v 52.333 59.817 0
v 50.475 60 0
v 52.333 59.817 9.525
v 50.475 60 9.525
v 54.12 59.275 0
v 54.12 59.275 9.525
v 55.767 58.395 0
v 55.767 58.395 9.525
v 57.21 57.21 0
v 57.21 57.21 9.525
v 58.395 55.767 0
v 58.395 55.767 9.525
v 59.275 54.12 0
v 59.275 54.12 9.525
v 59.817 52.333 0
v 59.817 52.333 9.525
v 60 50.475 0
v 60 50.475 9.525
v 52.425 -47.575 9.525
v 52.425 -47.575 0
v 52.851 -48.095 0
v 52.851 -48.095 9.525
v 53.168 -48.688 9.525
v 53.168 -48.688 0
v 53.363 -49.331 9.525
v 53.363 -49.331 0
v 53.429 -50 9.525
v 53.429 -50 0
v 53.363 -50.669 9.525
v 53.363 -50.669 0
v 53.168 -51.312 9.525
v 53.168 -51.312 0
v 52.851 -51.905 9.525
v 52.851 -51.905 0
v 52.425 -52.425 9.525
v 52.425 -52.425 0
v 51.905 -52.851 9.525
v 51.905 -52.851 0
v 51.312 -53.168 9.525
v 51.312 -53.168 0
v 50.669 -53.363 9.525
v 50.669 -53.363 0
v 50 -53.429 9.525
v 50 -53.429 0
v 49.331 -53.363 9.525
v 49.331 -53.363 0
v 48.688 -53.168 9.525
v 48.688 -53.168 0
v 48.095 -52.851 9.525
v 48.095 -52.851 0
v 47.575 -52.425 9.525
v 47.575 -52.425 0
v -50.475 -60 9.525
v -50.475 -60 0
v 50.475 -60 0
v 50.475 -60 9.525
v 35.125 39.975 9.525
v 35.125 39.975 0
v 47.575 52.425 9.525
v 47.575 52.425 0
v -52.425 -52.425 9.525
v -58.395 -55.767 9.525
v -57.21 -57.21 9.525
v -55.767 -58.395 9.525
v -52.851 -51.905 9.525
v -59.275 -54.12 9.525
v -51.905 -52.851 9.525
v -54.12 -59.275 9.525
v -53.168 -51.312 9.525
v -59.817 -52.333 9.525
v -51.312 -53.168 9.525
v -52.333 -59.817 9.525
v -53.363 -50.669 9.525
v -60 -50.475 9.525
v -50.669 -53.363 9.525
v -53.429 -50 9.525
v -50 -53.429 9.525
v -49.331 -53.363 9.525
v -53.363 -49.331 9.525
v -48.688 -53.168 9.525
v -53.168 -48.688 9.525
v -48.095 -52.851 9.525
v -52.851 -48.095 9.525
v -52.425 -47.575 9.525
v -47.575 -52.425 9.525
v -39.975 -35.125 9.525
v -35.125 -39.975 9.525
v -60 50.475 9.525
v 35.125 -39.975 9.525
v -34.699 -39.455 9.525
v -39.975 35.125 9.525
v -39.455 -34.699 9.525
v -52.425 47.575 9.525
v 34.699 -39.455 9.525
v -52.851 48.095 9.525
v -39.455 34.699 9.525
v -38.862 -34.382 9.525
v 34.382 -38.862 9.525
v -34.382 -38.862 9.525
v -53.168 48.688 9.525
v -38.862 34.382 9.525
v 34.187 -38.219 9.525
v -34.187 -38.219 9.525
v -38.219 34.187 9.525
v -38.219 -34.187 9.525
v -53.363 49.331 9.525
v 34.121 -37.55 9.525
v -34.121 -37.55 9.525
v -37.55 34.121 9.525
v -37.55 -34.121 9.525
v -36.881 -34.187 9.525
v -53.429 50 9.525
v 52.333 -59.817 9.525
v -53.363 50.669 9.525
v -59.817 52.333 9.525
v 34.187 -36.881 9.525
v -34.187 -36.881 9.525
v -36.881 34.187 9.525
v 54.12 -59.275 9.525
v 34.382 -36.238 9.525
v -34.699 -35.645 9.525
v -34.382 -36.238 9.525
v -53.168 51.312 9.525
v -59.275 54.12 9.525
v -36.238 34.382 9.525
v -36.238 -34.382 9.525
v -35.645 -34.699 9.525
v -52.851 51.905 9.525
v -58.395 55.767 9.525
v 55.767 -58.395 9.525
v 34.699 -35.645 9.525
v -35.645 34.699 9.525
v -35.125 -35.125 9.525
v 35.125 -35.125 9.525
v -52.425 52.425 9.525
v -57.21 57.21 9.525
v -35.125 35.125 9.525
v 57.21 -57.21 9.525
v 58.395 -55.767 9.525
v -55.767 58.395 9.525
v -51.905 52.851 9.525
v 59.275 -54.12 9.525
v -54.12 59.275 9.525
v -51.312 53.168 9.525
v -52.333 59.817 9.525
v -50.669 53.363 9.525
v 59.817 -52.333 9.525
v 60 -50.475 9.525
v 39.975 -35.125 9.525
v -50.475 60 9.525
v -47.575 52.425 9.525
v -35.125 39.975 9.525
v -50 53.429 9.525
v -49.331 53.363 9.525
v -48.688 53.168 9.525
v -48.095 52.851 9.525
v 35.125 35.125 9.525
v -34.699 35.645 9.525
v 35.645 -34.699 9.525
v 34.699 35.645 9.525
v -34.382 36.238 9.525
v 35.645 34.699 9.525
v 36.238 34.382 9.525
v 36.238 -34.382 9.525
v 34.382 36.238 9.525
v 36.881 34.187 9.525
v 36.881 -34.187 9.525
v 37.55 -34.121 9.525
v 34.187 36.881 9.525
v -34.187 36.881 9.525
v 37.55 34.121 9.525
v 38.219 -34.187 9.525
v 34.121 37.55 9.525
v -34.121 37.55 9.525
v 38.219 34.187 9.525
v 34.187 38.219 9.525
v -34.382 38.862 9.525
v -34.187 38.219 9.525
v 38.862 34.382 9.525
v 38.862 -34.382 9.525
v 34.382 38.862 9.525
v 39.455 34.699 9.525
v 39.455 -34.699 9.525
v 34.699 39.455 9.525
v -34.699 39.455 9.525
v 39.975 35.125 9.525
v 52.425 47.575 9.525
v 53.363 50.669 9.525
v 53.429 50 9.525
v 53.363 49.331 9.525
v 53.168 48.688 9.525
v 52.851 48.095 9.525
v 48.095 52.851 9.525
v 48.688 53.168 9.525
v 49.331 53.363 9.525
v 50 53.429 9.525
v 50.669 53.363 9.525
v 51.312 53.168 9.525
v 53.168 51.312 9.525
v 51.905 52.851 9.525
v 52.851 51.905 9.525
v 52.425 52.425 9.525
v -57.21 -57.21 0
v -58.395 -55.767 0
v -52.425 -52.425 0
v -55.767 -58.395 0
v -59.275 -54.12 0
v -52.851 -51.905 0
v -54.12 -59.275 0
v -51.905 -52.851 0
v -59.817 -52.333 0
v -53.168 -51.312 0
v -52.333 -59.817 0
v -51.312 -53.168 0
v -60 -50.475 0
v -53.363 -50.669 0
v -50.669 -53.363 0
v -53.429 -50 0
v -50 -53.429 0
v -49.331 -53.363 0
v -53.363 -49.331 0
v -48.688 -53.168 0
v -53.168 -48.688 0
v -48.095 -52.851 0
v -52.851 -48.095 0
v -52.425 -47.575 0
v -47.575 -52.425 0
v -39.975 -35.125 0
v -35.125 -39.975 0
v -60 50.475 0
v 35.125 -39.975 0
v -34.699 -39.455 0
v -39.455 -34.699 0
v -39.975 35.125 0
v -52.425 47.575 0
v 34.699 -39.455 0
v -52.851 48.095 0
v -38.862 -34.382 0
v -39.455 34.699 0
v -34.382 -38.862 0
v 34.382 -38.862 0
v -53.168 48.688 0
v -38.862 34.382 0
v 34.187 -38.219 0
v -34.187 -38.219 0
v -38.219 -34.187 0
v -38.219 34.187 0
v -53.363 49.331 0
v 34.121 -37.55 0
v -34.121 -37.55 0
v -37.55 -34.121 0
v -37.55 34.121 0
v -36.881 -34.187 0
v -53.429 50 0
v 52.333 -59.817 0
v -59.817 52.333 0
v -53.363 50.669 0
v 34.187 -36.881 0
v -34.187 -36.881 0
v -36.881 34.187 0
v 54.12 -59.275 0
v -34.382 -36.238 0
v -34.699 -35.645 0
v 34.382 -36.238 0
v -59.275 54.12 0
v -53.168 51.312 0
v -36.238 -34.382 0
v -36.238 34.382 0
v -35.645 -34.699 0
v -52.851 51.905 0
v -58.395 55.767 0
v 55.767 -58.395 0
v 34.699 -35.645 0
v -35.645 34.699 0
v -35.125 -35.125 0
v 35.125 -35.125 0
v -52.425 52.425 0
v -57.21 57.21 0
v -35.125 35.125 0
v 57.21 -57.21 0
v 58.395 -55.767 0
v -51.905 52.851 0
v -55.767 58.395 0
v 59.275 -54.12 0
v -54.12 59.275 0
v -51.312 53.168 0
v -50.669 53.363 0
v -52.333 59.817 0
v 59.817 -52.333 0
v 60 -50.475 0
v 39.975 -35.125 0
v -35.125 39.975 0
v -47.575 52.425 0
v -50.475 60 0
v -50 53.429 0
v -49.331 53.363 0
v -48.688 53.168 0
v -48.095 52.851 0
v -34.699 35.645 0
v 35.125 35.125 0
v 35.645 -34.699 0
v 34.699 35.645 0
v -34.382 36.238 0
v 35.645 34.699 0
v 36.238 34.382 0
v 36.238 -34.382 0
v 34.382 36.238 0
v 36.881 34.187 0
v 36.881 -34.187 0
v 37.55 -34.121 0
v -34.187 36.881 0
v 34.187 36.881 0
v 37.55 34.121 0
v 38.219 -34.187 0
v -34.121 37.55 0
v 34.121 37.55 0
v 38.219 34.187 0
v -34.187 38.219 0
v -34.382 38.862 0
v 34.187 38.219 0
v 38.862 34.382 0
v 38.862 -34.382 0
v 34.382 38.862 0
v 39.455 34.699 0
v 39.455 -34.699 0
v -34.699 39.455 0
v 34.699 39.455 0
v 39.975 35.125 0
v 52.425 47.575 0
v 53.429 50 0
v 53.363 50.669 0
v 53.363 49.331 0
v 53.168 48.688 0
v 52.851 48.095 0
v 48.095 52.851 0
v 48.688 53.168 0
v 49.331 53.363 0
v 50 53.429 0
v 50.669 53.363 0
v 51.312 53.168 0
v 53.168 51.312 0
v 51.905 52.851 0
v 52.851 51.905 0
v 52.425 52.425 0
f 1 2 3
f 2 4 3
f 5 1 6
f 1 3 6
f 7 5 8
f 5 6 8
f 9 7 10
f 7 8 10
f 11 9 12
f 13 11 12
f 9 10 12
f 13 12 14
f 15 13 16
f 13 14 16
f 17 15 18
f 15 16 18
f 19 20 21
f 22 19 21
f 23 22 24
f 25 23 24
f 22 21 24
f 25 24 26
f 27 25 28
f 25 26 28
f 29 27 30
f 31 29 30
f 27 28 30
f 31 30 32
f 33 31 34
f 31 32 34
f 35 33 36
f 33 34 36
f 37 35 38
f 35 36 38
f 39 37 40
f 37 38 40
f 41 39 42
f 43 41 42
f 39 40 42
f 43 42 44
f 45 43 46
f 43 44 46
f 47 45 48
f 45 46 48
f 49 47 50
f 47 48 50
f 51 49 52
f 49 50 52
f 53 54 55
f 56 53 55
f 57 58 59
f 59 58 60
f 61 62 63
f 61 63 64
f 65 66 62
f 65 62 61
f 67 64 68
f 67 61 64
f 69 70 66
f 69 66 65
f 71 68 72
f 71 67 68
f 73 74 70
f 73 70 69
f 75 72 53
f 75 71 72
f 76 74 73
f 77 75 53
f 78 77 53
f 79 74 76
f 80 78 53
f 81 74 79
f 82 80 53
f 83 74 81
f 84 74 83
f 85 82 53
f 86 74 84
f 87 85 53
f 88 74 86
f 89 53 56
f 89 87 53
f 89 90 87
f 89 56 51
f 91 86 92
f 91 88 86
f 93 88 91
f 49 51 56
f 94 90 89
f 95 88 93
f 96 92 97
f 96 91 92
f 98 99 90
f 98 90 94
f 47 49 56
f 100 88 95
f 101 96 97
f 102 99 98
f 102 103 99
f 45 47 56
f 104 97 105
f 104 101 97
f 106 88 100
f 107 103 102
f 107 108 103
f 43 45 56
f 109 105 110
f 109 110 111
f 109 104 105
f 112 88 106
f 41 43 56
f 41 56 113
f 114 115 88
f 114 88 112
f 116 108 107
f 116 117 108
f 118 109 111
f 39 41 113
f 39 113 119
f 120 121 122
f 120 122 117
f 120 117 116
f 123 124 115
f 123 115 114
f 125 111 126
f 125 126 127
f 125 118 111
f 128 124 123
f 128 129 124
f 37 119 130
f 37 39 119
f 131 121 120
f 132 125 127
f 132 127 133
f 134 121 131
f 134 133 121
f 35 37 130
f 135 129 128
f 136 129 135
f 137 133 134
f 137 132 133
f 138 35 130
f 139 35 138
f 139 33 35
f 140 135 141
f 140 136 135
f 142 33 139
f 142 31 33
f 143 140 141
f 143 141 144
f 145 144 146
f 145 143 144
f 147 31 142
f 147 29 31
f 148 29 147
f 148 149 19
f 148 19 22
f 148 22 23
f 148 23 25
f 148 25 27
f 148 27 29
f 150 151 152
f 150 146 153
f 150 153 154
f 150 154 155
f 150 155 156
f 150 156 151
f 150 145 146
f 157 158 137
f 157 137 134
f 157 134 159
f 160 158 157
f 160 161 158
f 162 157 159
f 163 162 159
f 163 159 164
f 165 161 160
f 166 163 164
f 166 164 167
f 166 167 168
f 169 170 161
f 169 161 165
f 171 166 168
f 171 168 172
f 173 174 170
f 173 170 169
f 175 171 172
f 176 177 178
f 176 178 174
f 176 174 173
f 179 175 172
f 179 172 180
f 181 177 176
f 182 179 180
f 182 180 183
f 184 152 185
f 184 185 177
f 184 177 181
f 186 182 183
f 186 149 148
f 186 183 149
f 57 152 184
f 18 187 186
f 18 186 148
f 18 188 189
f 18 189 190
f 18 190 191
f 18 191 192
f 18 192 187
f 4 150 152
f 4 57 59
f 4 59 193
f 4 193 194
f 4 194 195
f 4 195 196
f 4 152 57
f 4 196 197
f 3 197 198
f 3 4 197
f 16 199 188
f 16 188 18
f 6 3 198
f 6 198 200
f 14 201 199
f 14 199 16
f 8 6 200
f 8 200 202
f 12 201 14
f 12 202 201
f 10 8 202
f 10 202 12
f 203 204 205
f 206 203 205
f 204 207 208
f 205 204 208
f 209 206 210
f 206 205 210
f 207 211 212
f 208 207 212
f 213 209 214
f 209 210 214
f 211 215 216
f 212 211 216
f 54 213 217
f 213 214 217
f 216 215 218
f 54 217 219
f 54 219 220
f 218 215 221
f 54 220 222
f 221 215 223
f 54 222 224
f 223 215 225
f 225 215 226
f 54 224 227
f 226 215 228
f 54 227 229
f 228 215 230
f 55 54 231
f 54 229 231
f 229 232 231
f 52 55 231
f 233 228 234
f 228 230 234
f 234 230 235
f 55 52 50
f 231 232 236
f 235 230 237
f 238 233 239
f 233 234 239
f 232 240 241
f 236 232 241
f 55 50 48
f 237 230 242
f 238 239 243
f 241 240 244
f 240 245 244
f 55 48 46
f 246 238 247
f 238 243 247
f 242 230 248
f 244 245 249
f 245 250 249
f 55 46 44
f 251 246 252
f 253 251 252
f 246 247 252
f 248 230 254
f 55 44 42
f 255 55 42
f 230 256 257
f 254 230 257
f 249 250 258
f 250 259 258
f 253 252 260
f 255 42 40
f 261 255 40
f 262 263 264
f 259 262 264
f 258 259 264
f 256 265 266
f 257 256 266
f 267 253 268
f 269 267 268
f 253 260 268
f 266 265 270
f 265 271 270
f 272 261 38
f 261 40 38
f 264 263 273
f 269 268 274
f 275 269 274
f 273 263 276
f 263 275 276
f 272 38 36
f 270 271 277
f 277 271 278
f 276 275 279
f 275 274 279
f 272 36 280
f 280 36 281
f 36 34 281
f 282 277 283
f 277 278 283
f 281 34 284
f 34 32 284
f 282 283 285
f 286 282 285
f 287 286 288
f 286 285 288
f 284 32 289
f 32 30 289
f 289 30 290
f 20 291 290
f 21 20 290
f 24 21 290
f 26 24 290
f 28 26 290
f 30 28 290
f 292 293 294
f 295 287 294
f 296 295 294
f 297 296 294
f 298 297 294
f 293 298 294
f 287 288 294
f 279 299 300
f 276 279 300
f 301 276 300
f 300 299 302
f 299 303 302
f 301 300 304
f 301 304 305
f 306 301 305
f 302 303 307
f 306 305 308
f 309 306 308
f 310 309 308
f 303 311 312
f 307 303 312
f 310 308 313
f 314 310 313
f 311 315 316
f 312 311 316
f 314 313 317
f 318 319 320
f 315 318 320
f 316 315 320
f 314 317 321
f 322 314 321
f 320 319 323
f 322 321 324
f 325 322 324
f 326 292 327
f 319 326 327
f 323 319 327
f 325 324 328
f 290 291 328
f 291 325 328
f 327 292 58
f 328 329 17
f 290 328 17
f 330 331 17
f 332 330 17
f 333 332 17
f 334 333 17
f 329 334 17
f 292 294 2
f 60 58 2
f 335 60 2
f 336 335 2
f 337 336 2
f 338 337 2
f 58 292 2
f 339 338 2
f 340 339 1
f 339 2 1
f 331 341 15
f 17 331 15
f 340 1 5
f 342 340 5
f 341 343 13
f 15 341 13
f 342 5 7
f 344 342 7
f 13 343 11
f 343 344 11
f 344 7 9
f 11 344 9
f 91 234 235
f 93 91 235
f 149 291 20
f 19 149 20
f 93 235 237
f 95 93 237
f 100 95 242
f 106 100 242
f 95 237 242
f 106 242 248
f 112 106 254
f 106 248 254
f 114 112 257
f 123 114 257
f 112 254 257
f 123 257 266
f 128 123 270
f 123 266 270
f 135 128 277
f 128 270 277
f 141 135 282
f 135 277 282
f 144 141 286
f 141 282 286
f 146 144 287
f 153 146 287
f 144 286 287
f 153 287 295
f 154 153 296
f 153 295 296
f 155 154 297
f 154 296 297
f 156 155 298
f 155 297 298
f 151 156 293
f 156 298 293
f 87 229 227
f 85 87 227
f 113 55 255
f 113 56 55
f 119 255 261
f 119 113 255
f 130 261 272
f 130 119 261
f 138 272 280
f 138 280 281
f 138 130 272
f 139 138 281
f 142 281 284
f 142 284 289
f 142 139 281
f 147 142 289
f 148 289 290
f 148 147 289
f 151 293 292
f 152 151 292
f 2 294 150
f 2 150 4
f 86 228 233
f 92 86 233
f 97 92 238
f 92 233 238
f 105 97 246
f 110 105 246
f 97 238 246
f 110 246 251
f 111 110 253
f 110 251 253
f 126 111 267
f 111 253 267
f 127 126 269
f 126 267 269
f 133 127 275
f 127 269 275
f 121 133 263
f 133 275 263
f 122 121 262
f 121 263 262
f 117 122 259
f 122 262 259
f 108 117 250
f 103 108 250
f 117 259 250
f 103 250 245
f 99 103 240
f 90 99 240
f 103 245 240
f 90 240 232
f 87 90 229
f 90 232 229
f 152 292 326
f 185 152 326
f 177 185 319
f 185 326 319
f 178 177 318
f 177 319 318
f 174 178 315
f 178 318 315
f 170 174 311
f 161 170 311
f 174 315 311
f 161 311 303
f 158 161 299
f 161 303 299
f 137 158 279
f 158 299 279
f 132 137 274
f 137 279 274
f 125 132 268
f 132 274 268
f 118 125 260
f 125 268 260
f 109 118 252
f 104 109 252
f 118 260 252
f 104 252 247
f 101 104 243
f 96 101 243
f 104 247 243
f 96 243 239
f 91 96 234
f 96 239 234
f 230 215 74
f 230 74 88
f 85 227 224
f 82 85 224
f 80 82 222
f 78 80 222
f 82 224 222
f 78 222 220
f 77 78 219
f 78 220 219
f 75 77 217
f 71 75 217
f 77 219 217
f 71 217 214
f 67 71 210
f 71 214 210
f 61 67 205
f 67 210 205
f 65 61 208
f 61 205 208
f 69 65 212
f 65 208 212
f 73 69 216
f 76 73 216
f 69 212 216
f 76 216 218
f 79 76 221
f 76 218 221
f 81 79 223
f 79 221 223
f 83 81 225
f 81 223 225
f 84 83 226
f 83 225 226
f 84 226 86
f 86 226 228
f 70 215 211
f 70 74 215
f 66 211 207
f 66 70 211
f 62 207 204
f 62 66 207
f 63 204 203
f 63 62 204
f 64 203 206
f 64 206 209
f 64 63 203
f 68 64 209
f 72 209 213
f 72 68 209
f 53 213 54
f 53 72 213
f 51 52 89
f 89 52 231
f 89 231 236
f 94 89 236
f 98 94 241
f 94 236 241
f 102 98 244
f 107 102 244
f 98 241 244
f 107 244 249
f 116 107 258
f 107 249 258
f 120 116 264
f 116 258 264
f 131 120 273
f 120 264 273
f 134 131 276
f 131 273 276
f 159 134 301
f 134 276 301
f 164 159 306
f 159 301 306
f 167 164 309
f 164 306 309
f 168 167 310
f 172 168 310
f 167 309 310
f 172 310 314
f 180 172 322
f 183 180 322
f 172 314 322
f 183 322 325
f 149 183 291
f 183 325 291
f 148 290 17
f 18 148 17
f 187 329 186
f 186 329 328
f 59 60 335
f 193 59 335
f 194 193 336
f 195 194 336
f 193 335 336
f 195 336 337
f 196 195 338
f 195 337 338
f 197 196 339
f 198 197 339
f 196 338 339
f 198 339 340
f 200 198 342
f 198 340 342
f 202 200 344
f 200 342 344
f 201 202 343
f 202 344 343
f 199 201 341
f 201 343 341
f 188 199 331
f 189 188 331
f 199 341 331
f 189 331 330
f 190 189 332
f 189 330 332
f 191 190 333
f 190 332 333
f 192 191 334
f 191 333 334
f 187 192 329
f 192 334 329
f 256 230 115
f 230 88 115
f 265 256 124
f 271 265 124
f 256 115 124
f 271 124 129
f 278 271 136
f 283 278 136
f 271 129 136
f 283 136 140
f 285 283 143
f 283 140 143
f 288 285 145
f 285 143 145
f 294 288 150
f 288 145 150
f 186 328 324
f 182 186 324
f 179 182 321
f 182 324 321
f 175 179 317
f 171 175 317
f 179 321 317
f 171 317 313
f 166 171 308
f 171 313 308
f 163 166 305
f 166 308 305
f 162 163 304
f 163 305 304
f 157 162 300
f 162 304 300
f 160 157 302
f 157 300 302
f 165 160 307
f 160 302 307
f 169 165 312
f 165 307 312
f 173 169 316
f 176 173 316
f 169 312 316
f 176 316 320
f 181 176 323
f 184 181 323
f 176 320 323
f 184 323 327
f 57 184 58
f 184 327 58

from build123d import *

# Parameters (mm, degrees)
SKETCH2_W           = 120
SKETCH2_H           = 120
BOSS_EXTRUDE1_DEPTH = 9.525
CUT_EXTRUDE1_START  = -10.525
CUT_EXTRUDE1_DEPTH  = 11.525
CIRPATTERN1_COUNT   = 4
FILLET1_R           = 9.525


with BuildPart() as part:
    # Sketch2 → Boss-Extrude1 (new body)
    with BuildSketch(Plane.XY):
        Rectangle(SKETCH2_W, SKETCH2_H)
    extrude(amount=BOSS_EXTRUDE1_DEPTH)

    # Sketch3 → Cut-Extrude1 (cut)
    with BuildSketch(Plane.XY.offset(9.525).offset(CUT_EXTRUDE1_START)):
        with BuildLine():
            Line((-47.575330847, 52.424669153), (-35.125330847, 39.974669153))
            ThreePointArc((-35.125330847, 39.974669153), (-35.125330847, 35.125330847), (-39.974669153, 35.125330847))
            Line((-39.974669153, 35.125330847), (-52.424669153, 47.575330847))
            ThreePointArc((-52.424669153, 47.575330847), (-52.424669153, 52.424669153), (-47.575330847, 52.424669153))
        make_face()
    cut_extrude1 = extrude(amount=CUT_EXTRUDE1_DEPTH, mode=Mode.SUBTRACT)

    # CirPattern1: Cut-Extrude1 ×4 about axis
    cirpattern1_axis = Axis((0, 0, 0), (0, 0, 1))
    for i in range(1, CIRPATTERN1_COUNT):
        add(cut_extrude1.rotate(cirpattern1_axis, i * 360 / CIRPATTERN1_COUNT), mode=Mode.SUBTRACT)

    # Fillet1
    fillet1_edges = [part.edges().sort_by_distance(p)[0] for p in [
        (60, -60, 4.7625),
        (-60, -60, 4.7625),
        (-60, 60, 4.7625),
        (60, 60, 4.7625),
    ]]
    fillet(fillet1_edges, radius=FILLET1_R)


solid = part.part
